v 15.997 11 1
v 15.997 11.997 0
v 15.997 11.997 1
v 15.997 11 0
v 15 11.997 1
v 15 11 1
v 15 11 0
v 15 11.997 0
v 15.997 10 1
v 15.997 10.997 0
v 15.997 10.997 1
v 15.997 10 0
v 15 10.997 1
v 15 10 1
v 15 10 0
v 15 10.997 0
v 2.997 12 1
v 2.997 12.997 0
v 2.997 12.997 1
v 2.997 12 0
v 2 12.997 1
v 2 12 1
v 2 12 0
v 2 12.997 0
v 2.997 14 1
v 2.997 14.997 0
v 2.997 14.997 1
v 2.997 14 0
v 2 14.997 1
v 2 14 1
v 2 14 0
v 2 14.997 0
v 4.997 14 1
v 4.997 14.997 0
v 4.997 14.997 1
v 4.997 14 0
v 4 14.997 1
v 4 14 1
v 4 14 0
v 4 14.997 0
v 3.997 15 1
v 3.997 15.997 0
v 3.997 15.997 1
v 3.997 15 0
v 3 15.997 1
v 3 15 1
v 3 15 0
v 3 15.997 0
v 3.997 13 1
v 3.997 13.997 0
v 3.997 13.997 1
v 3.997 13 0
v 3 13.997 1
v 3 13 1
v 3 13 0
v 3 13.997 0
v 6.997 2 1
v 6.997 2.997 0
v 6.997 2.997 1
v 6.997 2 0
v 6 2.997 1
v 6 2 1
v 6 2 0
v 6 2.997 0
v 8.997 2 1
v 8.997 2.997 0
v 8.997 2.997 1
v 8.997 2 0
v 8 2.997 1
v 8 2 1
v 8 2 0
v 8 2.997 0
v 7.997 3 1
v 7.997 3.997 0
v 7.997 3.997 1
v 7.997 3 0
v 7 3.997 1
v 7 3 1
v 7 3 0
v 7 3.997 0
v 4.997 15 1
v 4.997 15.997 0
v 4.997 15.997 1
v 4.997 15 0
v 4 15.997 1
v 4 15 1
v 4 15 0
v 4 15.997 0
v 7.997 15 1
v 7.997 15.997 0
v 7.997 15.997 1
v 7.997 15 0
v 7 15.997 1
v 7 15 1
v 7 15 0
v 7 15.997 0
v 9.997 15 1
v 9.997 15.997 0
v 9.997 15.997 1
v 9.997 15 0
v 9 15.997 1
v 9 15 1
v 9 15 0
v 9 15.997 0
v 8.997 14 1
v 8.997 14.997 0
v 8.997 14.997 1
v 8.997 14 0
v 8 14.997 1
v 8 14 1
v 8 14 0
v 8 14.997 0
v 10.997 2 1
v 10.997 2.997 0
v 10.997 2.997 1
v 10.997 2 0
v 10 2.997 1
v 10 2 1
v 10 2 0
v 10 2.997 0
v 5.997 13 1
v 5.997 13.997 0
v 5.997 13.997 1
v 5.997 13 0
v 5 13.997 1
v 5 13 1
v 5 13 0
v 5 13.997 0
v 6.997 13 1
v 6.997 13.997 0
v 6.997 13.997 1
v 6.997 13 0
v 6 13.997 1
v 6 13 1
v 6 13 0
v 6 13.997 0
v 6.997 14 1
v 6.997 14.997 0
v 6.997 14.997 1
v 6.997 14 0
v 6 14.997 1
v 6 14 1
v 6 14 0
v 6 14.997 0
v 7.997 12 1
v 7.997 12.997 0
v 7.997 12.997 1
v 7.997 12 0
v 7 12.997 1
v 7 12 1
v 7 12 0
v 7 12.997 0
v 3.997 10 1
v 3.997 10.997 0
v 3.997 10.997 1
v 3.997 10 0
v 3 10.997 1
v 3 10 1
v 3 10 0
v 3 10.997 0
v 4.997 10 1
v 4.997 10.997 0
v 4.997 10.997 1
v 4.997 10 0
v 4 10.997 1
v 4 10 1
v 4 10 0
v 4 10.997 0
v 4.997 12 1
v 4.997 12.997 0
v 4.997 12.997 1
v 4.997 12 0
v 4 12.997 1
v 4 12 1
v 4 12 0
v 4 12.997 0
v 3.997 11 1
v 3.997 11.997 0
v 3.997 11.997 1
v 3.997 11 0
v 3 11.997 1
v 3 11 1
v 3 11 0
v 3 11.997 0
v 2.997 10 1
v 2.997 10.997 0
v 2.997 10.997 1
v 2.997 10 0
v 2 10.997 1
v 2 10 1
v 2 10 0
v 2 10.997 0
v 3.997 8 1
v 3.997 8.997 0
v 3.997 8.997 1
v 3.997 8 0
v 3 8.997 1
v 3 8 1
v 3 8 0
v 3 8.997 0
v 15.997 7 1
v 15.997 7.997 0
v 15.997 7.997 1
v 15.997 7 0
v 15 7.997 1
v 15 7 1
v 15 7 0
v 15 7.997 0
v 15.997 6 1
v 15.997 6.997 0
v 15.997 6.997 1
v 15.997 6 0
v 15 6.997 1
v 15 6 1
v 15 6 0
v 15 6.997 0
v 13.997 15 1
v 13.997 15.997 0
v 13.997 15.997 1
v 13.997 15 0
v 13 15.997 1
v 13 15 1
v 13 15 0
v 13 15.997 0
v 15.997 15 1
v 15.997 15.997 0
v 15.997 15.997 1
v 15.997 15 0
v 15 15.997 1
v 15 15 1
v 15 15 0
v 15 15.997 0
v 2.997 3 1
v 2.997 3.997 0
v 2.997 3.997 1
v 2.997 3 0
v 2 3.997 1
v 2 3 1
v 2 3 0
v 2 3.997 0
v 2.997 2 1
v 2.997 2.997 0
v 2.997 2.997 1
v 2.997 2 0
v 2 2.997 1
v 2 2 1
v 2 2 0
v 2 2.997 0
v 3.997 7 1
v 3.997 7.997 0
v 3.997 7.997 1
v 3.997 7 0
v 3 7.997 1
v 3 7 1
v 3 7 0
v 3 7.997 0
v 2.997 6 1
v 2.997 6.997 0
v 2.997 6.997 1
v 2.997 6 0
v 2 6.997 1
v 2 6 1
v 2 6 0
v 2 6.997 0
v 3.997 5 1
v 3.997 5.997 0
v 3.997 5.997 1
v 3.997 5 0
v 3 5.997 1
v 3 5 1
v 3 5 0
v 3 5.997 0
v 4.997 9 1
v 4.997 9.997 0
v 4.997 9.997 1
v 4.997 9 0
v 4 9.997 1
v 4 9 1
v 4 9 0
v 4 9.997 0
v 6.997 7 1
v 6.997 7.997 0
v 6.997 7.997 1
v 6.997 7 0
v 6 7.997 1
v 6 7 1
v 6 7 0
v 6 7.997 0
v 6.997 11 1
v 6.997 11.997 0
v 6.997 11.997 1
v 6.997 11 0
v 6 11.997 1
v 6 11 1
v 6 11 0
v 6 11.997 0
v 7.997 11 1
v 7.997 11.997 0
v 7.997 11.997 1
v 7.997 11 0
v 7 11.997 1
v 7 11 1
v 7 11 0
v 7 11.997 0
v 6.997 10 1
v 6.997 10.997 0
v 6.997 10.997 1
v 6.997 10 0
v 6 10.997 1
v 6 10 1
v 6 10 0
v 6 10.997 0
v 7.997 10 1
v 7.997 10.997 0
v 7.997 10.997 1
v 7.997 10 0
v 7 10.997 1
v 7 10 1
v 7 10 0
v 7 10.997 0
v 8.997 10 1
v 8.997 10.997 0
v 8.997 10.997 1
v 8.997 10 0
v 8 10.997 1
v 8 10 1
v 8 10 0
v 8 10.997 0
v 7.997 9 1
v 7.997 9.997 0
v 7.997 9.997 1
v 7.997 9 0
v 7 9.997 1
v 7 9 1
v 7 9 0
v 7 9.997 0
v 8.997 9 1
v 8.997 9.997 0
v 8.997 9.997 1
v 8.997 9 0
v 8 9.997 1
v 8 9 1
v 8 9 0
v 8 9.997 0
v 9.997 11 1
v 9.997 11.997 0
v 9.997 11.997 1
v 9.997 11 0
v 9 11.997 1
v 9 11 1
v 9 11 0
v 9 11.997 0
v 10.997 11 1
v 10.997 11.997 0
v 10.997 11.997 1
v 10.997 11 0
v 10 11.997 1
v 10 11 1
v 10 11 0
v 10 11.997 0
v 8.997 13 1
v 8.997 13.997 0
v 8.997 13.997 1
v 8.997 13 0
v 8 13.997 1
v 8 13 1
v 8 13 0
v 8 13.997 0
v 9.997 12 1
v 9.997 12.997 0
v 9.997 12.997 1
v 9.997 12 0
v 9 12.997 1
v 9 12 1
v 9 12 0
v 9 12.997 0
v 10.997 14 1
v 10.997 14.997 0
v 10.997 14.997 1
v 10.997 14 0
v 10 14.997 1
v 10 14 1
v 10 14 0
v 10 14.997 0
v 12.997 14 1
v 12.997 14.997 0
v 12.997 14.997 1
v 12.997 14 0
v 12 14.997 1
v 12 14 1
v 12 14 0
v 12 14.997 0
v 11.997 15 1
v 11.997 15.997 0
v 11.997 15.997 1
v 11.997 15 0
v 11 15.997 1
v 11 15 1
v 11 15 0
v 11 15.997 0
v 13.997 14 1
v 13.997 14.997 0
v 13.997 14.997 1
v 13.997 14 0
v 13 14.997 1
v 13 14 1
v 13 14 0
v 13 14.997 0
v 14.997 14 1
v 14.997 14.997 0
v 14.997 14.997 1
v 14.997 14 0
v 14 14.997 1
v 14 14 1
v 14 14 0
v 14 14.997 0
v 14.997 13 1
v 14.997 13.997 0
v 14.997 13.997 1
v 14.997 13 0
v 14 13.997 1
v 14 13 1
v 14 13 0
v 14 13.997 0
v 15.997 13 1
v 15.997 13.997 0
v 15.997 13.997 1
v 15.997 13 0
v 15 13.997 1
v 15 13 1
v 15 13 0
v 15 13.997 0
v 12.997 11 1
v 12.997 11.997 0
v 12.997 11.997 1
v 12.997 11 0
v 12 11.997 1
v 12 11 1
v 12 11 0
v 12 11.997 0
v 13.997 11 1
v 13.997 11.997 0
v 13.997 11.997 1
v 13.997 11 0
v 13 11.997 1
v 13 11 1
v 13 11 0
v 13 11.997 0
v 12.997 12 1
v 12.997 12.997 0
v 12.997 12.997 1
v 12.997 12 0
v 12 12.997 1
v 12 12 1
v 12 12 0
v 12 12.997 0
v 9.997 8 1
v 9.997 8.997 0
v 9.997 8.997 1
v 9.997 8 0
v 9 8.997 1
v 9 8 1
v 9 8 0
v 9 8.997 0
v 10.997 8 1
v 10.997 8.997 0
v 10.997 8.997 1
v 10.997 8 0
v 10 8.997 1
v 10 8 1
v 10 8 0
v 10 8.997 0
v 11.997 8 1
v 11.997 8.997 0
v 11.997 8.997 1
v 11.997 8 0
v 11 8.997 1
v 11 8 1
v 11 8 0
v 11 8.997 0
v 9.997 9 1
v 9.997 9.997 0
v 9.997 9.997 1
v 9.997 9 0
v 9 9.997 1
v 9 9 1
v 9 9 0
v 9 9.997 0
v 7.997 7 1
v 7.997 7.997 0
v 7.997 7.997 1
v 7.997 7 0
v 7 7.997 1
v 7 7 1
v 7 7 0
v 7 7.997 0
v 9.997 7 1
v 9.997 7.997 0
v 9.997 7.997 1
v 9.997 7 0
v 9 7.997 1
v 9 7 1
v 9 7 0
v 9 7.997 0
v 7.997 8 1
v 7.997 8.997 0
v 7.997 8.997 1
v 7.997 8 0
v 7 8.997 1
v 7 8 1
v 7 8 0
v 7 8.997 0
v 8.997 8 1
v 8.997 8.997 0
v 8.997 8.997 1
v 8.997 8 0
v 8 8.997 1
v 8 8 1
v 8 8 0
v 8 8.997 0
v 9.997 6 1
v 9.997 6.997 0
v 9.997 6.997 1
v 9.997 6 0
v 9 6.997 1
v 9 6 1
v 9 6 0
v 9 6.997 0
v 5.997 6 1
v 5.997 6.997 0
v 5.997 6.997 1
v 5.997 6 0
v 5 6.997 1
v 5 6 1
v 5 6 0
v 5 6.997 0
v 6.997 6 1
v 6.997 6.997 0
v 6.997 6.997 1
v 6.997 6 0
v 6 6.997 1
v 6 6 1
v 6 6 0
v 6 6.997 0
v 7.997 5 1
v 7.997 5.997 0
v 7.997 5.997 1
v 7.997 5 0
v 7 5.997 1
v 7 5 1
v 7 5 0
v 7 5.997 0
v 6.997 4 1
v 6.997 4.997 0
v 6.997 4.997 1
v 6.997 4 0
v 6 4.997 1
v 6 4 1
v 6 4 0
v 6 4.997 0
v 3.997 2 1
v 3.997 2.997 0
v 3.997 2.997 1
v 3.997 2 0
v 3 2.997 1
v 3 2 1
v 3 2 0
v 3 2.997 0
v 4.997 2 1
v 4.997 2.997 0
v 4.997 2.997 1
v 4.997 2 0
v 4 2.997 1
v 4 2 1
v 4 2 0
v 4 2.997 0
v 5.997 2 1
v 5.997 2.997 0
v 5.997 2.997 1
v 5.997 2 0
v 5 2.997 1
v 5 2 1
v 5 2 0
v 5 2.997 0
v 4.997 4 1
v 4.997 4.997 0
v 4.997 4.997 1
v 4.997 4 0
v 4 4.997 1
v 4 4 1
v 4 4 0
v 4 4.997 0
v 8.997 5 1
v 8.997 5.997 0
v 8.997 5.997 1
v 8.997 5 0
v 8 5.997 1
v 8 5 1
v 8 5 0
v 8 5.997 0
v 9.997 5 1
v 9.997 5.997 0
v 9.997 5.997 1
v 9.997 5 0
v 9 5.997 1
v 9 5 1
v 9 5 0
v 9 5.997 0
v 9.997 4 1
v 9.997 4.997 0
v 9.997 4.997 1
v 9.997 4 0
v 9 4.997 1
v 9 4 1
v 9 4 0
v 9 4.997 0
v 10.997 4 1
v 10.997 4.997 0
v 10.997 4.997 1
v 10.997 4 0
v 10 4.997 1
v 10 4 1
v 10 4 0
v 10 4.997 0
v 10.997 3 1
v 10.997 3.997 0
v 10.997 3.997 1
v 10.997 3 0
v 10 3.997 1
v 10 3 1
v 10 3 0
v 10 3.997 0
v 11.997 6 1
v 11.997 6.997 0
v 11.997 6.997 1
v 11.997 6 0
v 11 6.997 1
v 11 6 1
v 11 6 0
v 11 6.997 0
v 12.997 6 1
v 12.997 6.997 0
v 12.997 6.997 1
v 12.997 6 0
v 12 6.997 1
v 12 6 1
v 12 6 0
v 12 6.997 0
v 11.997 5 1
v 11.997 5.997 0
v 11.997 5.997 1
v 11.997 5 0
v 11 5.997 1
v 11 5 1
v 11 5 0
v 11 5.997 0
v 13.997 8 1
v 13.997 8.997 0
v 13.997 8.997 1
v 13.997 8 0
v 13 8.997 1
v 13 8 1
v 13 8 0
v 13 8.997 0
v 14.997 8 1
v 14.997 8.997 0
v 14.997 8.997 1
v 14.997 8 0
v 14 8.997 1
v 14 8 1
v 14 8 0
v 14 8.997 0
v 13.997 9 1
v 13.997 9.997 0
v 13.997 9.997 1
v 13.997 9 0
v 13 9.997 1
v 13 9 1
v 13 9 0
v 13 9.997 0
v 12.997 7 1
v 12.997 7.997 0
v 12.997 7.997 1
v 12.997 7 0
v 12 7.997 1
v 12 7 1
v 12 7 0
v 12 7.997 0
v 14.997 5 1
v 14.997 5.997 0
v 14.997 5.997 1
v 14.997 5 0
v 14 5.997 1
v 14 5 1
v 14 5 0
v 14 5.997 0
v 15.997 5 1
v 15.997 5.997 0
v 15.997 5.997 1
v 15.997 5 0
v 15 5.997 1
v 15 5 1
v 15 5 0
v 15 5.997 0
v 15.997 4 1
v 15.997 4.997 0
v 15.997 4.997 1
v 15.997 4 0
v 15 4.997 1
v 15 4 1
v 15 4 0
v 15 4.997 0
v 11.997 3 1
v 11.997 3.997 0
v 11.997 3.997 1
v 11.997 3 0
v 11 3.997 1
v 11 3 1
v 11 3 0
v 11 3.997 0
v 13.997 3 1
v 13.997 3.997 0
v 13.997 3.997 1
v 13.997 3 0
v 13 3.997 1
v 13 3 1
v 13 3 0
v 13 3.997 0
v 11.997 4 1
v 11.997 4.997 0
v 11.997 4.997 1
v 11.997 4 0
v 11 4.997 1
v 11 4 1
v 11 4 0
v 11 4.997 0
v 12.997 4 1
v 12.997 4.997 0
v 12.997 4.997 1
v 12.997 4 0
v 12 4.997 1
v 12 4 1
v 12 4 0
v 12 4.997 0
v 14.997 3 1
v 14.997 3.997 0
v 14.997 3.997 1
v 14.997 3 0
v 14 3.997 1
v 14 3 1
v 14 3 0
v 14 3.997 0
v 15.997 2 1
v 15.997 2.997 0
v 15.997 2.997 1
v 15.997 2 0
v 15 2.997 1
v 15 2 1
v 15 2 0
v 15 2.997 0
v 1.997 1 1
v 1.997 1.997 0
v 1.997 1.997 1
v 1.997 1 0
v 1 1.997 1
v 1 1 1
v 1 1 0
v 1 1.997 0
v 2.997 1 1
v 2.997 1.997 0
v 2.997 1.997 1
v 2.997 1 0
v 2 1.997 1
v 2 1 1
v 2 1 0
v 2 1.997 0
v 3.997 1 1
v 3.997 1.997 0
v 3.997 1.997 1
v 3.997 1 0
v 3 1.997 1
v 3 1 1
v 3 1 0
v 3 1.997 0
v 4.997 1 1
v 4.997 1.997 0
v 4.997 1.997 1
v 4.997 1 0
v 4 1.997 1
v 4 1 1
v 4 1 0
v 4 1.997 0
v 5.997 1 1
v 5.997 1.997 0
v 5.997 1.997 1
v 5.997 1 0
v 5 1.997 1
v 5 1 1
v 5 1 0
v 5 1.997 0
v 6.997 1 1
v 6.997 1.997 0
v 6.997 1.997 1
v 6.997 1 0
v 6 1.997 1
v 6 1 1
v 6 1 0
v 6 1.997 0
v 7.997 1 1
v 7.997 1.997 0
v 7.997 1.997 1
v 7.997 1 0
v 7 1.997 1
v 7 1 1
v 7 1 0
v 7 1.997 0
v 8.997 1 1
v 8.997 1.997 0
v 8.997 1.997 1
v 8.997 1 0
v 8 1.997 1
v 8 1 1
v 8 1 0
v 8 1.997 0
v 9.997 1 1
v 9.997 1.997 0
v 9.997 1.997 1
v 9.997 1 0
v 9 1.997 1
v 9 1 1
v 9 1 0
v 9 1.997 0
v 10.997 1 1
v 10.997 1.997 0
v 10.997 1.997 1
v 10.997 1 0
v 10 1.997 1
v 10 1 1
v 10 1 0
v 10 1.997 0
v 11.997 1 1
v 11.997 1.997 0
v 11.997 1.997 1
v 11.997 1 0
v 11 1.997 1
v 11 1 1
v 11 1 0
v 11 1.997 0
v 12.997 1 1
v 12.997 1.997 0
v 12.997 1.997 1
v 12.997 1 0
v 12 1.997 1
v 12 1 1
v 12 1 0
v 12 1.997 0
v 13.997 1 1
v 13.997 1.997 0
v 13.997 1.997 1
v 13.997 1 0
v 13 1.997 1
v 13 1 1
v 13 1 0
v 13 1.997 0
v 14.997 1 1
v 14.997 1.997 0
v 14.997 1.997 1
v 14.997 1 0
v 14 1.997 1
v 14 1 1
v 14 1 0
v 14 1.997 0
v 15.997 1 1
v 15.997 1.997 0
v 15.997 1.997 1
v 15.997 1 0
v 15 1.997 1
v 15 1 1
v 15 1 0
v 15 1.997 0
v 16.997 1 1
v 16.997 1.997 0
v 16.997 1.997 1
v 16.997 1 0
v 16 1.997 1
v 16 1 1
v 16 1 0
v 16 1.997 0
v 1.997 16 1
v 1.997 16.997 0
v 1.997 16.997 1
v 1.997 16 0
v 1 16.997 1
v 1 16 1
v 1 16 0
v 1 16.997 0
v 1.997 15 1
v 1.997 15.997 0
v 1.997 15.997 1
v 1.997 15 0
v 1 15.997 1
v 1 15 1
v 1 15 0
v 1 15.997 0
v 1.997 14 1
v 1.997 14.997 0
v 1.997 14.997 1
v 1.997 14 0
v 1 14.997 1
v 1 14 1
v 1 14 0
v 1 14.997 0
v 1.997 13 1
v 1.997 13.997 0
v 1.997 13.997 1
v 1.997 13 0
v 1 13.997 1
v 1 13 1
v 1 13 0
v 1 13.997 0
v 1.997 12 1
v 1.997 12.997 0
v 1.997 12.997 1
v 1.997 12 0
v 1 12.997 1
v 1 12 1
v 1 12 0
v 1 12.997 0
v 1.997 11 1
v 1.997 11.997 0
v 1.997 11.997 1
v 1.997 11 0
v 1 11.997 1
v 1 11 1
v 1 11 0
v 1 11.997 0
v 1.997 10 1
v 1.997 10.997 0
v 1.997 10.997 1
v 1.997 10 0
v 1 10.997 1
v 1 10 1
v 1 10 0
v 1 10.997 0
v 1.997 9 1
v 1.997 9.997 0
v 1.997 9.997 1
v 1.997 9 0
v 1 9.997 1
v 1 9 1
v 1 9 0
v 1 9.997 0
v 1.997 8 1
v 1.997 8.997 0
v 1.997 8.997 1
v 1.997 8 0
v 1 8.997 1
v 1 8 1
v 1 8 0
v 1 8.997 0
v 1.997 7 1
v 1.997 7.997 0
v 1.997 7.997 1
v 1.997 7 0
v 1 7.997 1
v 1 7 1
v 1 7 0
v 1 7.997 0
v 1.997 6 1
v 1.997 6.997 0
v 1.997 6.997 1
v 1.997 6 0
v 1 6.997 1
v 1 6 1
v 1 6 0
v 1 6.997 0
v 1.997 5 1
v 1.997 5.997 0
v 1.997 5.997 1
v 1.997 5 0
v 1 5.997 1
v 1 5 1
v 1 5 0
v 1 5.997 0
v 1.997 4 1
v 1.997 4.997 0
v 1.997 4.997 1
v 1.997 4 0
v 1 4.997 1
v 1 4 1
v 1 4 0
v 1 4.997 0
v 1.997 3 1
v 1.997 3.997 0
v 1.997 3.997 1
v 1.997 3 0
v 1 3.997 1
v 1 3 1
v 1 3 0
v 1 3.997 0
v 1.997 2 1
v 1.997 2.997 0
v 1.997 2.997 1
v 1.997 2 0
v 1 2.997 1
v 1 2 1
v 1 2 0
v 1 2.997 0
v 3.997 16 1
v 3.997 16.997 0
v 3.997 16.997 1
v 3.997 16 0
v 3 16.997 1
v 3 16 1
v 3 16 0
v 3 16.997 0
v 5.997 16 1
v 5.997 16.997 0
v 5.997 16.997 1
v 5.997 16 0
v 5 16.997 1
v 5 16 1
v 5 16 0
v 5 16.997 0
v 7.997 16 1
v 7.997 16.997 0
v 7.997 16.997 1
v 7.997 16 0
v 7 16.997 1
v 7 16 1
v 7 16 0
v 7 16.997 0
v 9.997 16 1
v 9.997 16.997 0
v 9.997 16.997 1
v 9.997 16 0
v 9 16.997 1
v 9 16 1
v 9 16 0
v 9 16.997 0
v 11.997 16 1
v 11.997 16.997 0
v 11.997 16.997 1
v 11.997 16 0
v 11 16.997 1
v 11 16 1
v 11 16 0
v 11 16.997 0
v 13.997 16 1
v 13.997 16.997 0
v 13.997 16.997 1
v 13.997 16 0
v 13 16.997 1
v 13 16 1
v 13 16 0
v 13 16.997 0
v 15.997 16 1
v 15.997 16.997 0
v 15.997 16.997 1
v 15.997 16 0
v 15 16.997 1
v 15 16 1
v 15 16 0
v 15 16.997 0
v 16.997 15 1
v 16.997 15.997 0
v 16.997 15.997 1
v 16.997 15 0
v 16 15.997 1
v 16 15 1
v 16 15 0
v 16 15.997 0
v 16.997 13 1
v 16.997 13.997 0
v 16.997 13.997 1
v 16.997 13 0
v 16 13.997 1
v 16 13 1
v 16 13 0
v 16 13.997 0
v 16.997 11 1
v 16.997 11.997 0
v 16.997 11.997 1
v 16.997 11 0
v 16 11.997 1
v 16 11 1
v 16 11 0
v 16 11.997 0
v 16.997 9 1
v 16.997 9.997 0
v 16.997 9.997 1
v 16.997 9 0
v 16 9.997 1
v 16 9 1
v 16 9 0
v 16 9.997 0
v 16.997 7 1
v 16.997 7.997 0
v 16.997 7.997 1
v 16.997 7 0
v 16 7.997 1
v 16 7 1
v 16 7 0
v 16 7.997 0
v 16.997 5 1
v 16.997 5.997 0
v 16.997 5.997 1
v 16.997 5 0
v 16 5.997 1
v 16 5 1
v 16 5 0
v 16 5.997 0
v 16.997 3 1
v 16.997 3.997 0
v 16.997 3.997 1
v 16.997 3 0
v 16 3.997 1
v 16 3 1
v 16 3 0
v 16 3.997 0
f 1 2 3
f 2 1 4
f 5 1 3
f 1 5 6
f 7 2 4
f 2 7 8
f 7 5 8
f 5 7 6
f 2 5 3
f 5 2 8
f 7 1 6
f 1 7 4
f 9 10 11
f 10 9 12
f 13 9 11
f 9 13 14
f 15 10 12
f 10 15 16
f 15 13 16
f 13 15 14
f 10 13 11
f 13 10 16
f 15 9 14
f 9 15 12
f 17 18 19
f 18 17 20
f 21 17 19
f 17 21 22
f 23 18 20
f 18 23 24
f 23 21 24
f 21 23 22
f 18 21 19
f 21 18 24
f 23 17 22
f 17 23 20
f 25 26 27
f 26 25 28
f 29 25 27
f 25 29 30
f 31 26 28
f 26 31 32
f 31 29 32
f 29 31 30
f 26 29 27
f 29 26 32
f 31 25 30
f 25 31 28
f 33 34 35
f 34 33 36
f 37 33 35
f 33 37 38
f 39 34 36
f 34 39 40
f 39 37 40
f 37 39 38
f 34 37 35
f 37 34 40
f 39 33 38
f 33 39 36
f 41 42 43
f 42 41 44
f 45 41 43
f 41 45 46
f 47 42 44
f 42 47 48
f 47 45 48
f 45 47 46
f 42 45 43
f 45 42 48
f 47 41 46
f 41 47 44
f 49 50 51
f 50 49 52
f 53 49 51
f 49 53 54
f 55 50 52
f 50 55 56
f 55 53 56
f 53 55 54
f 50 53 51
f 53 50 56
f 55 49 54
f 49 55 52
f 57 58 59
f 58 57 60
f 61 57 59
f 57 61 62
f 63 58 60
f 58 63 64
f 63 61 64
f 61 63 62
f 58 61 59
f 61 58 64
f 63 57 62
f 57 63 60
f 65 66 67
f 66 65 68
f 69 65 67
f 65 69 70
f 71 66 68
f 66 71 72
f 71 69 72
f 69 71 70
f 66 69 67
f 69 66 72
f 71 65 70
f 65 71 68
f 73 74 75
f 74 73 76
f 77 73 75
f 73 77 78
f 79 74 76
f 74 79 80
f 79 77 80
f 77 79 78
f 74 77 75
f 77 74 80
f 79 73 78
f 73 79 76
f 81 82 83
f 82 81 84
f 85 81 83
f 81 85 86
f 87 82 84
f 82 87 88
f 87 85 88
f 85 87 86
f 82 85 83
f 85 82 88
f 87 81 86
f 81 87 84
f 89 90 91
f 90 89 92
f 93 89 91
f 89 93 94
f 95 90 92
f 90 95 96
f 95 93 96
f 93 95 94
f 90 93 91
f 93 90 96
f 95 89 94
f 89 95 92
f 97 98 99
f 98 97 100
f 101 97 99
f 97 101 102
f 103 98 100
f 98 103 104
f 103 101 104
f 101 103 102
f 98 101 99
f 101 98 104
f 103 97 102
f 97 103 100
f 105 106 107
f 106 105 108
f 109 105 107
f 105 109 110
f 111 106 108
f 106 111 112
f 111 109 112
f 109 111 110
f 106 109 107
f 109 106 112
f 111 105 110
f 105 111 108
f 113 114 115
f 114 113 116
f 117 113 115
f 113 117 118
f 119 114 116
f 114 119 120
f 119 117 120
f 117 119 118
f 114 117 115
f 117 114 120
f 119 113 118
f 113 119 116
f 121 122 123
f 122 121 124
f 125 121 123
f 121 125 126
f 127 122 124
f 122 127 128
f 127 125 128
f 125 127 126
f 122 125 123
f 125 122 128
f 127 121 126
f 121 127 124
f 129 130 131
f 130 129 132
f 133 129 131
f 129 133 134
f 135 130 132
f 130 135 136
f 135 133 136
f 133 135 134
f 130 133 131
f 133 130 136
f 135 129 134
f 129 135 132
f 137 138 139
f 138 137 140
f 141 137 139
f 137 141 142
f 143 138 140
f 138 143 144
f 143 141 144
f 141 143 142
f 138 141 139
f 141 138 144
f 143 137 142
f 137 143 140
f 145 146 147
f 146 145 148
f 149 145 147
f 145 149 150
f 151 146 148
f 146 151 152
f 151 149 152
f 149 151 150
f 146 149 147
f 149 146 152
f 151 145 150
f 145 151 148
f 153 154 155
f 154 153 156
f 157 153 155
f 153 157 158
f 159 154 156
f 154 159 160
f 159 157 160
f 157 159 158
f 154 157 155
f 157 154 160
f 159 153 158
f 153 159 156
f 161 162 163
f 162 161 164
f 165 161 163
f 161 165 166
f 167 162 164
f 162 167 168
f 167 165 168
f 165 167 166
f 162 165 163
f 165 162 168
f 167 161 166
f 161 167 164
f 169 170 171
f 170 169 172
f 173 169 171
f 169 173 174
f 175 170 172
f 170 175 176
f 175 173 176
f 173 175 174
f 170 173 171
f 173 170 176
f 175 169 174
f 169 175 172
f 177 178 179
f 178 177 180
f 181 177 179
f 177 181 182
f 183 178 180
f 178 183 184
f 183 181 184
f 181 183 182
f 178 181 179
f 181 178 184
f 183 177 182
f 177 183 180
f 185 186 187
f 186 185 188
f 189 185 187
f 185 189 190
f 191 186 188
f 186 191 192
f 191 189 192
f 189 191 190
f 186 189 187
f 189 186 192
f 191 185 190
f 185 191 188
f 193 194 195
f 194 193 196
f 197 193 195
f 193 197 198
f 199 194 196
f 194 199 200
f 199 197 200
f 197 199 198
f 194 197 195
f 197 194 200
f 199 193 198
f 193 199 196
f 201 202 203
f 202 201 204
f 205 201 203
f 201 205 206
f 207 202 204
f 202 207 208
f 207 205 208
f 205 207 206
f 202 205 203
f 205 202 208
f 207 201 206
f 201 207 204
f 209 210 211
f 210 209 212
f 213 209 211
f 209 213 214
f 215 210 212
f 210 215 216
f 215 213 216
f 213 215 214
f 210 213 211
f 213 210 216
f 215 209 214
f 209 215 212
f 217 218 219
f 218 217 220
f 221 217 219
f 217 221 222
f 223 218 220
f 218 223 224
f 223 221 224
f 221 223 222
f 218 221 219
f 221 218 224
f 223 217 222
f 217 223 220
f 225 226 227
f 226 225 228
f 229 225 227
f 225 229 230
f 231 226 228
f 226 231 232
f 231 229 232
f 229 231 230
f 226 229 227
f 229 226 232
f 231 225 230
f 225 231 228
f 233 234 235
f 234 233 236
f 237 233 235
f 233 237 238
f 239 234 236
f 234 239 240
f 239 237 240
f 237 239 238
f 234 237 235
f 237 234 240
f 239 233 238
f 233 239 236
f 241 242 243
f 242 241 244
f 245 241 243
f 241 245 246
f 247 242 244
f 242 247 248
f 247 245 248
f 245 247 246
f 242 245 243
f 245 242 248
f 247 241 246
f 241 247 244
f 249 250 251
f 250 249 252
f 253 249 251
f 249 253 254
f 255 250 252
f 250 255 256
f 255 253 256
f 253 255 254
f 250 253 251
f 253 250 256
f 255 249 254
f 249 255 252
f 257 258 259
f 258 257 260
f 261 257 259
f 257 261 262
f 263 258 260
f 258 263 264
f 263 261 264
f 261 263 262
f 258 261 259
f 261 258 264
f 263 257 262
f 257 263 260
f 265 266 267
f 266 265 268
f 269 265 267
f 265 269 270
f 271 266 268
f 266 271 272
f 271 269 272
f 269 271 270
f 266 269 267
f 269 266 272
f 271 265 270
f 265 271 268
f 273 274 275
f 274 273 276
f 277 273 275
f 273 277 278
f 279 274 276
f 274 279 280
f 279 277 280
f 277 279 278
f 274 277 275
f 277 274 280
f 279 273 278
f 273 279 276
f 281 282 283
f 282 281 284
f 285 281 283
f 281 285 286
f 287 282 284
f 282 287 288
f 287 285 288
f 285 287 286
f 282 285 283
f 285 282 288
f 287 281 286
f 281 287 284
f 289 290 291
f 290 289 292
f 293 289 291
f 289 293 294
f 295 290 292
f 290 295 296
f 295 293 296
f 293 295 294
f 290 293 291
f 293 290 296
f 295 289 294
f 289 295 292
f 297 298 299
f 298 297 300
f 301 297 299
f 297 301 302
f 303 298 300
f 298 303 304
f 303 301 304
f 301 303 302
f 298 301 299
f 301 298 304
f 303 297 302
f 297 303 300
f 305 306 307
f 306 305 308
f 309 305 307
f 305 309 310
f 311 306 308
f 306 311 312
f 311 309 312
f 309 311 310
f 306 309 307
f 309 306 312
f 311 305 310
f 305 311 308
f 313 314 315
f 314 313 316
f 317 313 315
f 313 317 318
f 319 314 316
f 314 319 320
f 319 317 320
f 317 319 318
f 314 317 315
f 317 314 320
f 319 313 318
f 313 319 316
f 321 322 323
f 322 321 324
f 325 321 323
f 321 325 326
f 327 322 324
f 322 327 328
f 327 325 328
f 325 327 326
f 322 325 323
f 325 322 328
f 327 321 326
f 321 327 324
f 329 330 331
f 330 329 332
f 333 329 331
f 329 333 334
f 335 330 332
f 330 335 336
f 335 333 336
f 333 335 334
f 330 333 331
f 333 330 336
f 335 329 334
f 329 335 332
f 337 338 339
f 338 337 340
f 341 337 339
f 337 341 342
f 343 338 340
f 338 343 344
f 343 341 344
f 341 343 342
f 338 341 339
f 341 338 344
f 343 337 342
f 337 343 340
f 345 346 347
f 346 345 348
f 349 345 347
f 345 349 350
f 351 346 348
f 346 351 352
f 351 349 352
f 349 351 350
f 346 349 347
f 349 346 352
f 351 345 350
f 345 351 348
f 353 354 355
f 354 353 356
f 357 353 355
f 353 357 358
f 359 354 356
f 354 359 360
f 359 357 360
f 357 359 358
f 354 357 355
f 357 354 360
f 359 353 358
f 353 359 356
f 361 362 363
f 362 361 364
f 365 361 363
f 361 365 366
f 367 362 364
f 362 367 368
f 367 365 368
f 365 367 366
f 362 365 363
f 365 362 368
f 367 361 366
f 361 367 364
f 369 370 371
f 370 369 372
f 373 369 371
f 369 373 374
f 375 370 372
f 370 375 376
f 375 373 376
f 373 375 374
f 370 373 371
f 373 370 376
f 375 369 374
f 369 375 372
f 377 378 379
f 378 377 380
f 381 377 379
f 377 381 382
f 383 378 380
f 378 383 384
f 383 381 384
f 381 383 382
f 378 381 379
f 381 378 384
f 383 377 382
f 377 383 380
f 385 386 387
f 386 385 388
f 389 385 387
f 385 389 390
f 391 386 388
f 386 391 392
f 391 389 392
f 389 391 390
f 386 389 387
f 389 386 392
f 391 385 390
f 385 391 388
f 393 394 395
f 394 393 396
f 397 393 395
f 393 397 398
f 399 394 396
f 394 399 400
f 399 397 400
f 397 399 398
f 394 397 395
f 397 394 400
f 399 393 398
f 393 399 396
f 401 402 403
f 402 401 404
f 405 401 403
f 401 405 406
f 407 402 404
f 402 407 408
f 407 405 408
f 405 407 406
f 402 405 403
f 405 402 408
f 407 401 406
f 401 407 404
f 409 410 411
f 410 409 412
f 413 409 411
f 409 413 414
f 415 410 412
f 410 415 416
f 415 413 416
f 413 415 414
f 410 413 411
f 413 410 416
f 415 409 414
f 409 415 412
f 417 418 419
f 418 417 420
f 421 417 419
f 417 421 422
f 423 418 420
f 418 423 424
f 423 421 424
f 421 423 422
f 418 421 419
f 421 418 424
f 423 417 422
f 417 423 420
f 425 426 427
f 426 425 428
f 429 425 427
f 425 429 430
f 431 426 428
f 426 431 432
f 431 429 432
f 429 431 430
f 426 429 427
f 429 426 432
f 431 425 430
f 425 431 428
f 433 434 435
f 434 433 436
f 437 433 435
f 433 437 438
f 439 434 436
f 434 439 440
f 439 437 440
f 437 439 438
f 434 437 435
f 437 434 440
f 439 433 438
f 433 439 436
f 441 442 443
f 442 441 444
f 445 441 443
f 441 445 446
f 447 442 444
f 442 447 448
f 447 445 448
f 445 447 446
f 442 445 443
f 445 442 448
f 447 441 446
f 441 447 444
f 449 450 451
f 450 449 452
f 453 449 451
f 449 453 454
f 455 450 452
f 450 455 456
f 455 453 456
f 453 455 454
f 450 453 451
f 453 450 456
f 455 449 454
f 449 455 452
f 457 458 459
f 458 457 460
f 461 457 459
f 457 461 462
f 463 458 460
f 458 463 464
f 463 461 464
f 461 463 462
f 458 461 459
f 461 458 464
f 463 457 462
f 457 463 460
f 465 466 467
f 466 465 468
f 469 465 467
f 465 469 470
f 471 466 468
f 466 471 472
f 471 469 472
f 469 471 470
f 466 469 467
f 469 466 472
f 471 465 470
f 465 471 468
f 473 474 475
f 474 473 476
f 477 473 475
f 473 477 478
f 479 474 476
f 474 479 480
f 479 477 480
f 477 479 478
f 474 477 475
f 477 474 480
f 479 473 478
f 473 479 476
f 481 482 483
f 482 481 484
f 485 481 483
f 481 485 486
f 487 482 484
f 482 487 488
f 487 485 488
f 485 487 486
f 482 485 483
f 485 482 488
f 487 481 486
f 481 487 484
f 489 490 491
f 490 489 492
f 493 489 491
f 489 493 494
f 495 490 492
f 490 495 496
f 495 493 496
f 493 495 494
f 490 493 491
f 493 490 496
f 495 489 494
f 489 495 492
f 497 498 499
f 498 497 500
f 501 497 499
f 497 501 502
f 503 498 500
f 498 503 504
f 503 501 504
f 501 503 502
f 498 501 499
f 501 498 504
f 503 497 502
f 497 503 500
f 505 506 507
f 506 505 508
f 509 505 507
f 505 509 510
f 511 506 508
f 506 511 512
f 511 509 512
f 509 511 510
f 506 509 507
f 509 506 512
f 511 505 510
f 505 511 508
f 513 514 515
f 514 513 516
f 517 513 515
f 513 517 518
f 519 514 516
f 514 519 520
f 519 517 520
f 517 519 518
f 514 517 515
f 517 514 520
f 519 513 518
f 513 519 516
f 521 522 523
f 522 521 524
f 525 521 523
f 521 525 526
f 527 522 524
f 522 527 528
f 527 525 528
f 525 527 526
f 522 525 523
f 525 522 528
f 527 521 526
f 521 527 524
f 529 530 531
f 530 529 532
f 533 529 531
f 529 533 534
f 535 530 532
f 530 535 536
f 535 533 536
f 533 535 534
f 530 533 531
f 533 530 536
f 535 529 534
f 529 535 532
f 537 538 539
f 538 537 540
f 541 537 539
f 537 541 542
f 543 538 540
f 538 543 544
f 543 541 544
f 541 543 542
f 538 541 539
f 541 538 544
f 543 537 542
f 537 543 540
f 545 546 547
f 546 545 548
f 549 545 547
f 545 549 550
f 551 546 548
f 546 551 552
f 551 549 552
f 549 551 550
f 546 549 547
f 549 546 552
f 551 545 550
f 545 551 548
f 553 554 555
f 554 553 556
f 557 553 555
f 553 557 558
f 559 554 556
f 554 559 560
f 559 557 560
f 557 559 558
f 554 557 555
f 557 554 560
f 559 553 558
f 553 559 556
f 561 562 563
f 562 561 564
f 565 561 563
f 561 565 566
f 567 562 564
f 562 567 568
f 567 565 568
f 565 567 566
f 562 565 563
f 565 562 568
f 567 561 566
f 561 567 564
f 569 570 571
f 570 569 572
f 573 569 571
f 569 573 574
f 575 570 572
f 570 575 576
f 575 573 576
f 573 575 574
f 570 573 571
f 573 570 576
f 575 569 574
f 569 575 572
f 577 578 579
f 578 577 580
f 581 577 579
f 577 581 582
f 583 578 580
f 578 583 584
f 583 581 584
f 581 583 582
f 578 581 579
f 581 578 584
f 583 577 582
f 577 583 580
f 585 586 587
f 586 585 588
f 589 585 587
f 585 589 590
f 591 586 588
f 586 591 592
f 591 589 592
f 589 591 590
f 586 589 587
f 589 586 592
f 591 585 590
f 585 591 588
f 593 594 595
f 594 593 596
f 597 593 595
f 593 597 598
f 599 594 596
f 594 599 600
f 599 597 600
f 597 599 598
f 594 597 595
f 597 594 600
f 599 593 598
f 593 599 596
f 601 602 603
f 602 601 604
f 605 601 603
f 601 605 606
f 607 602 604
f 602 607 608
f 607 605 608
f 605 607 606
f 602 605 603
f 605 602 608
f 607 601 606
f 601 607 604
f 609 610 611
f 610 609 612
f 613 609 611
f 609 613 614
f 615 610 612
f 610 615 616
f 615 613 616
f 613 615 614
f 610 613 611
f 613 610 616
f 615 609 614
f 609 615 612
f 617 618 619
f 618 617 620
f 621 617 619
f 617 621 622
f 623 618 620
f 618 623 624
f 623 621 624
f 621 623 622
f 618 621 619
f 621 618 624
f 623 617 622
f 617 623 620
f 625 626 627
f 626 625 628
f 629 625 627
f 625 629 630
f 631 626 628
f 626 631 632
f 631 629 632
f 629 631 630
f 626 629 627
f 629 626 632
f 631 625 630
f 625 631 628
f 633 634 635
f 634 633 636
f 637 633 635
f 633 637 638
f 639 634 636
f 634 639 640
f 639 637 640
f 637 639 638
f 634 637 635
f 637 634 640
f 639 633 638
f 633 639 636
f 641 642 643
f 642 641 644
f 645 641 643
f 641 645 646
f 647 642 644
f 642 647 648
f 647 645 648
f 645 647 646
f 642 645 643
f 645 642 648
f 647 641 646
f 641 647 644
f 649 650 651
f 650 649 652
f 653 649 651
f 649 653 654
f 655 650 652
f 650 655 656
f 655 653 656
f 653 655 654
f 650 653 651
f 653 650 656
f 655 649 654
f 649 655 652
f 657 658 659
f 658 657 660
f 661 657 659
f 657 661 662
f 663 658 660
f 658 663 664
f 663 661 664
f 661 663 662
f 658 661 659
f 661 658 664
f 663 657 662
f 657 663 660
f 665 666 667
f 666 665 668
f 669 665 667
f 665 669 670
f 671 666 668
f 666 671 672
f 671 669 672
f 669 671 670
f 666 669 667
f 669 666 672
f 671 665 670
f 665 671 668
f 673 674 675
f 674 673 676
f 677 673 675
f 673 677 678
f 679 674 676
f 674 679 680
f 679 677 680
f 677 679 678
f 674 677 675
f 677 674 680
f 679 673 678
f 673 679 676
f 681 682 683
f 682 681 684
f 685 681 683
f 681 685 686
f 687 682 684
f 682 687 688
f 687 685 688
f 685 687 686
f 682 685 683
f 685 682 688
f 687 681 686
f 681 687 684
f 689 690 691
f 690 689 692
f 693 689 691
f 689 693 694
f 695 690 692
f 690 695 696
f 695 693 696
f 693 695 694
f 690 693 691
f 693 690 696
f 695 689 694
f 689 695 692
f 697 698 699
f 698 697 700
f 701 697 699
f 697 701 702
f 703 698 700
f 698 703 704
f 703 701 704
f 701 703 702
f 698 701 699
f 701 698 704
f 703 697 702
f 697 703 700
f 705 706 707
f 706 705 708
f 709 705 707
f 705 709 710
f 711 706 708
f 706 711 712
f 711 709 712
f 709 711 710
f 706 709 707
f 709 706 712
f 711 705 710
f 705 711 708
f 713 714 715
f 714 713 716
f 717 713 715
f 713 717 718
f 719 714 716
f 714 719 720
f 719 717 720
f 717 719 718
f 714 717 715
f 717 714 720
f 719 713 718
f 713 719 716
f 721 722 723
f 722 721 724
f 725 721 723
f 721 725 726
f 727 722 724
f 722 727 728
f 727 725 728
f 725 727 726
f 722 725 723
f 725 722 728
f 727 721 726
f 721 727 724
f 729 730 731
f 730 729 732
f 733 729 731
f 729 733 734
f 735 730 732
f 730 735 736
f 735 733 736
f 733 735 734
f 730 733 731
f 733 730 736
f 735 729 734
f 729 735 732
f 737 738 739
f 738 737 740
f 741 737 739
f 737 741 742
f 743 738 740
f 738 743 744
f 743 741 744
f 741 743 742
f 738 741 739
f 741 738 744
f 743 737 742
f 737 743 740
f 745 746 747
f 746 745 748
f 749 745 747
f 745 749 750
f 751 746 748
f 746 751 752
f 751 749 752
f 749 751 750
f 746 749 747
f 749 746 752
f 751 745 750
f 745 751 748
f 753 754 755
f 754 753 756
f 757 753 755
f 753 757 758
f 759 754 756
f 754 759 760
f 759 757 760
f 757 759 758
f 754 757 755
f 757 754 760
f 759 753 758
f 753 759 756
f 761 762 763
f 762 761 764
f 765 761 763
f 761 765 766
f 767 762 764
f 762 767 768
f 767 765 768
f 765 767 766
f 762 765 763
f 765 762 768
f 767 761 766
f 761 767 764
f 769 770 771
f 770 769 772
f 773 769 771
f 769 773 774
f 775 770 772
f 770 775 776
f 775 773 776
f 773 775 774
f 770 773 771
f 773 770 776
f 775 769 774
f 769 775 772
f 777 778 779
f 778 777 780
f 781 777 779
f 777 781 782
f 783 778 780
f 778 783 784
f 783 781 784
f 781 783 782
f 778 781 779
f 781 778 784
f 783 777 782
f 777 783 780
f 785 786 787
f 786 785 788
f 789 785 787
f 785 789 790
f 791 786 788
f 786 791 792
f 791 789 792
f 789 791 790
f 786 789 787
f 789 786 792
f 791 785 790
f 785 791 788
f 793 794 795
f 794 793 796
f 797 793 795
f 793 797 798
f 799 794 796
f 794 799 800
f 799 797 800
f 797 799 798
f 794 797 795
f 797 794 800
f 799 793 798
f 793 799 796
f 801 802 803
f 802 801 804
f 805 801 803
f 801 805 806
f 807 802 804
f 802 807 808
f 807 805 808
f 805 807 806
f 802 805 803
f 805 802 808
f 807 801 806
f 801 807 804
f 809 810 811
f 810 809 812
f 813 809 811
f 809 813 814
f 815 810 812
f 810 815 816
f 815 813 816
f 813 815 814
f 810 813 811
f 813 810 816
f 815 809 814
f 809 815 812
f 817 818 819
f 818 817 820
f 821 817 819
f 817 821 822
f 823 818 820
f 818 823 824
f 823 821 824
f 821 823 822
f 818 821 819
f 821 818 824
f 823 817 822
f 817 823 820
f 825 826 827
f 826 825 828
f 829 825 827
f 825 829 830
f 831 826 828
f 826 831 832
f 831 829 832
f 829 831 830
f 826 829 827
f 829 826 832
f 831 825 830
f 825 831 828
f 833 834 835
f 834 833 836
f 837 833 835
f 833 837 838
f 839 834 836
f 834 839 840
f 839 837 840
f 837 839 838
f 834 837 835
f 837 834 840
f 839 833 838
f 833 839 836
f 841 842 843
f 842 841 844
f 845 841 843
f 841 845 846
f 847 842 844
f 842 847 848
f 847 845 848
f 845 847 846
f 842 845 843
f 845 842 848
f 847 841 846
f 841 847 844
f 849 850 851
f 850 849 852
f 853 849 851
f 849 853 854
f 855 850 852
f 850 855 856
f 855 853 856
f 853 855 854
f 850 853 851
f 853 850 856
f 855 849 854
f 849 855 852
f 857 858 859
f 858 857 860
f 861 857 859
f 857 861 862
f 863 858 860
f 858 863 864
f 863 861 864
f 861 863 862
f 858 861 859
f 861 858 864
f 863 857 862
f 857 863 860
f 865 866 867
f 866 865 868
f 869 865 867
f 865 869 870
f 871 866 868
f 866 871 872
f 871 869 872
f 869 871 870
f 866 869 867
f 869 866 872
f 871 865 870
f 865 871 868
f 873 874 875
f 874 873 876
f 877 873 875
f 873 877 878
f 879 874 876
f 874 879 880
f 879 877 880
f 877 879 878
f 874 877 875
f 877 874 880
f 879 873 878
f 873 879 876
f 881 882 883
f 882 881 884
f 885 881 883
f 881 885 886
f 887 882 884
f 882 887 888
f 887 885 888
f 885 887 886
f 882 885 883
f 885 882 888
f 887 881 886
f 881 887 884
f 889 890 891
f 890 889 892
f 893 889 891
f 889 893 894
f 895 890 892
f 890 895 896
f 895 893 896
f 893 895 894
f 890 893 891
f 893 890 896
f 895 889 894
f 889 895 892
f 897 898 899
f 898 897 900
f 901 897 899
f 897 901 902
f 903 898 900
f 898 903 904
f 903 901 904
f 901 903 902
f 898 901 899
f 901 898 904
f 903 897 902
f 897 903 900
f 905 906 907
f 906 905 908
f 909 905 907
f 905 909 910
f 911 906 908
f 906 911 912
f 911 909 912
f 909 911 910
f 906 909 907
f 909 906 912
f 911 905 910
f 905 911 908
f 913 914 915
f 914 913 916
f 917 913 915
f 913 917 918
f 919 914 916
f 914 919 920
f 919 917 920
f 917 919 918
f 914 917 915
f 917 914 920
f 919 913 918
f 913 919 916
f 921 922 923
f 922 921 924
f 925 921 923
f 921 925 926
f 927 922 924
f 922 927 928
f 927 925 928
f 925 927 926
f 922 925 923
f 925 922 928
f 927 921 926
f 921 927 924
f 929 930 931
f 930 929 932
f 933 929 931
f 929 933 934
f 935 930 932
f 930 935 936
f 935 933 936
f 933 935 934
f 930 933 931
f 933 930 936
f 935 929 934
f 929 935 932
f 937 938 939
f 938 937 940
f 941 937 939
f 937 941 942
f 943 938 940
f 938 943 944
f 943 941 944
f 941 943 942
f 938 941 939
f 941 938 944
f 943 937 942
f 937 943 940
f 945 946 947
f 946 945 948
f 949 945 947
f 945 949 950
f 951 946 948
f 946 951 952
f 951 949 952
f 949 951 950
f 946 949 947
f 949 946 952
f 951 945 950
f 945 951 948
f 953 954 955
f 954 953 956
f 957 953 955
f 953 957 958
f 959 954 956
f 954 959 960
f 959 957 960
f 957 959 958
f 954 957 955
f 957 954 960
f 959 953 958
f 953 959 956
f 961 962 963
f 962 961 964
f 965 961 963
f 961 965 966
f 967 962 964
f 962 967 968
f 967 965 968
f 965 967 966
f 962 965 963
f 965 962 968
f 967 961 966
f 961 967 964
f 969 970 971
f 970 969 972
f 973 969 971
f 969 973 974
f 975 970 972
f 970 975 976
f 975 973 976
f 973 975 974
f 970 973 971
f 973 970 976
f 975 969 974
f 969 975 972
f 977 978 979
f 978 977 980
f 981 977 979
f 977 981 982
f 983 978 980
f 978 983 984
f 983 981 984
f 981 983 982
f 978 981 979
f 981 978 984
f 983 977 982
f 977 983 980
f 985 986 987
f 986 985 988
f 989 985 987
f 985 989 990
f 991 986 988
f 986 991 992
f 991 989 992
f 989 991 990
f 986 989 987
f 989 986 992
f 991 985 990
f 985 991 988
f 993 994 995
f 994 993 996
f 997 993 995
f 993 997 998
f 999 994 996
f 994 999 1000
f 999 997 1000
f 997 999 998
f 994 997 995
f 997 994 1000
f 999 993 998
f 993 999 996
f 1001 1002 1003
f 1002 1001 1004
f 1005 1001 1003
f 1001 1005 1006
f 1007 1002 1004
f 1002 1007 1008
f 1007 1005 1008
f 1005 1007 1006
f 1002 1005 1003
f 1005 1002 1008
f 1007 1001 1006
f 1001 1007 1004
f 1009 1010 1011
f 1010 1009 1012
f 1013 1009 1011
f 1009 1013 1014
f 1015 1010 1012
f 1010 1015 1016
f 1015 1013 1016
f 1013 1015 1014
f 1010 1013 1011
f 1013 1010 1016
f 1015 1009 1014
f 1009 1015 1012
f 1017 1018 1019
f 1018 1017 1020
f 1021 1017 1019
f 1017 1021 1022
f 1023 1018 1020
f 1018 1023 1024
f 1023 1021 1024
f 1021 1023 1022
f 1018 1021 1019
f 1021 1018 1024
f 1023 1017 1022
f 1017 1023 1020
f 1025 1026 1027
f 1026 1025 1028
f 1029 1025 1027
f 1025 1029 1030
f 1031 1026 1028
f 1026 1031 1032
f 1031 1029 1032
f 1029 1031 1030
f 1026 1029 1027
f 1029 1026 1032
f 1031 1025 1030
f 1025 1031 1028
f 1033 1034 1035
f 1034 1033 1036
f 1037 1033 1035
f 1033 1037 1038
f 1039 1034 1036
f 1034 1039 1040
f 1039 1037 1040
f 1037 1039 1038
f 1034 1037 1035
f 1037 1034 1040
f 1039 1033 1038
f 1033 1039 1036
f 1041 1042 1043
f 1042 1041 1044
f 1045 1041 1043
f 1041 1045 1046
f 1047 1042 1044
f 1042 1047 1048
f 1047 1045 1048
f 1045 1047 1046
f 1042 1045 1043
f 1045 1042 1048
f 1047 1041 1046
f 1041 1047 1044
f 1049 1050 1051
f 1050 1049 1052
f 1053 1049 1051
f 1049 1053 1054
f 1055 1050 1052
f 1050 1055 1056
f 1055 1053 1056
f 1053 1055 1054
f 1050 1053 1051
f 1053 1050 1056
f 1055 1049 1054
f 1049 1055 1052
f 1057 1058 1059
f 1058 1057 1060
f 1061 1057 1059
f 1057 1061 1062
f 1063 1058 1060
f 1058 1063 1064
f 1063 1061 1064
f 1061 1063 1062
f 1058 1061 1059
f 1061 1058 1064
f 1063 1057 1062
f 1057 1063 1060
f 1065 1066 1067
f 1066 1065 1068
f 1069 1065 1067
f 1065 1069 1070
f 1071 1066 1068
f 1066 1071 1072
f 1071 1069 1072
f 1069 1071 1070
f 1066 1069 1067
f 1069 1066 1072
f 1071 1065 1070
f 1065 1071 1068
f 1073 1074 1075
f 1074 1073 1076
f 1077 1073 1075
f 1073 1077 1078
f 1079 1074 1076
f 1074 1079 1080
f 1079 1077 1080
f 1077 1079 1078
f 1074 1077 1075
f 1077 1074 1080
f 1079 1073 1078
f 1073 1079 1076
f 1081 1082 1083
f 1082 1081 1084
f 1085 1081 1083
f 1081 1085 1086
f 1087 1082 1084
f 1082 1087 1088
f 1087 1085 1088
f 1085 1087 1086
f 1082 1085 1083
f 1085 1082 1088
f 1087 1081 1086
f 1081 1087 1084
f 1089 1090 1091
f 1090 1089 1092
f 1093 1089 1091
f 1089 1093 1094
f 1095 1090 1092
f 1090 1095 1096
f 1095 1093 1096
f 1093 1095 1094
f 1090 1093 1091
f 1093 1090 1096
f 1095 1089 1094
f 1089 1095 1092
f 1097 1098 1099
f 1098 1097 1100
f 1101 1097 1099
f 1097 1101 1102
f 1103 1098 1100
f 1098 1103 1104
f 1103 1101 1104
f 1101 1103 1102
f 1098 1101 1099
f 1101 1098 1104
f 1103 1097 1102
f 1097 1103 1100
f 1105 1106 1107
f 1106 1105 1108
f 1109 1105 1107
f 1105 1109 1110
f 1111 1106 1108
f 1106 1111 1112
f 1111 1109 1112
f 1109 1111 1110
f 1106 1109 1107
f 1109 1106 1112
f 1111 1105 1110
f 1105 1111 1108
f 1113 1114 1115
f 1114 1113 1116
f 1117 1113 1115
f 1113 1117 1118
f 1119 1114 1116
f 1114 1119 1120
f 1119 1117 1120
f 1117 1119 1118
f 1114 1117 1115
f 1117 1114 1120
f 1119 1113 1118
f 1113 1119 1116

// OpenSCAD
// file: ../../util/bitmap.scad
/*****************************************************************************
 * Module Bitmap Library
 * Modules to create bitmaps of unit squares from 1 or 2 dimensional vectors.
 *****************************************************************************
 * Copyright 2017 Chris Baker
 *
 * This program is free software: you can redistribute it and/or modify
 * it under the terms of the GNU Lesser General Public License as published by
 * the Free Software Foundation, either version 3 of the License, or
 * (at your option) any later version.
 *
 * This program is distributed in the hope that it will be useful,
 * but WITHOUT ANY WARRANTY; without even the implied warranty of
 * MERCHANTABILITY or FITNESS FOR A PARTICULAR PURPOSE.  See the
 * GNU Lesser General Public License for more details.
 *
 * You should have received a copy of the GNU Lesser General Public License
 * along with this program.  If not, see <http://www.gnu.org/licenses/>.
 *****************************************************************************
 * Usage:
 * Include this file with the "use" tag.
 * Depends on compat.scad library.
 *
 * API:
 *   1dbitmap(bitmap, center, pullback, vector_mode)
 *   2dbitmap(bitmap, center, pullback, vector_mode)
 *     Generate a 1 or 2-Dimensional field of modules based on the provided
 *     bitmap vector. See Bitmap Vectors below.
 *     The center flag determines whether to center the bitmap on the origin.
 *     The pullback value shrinks each module in the x and y dimension by the
 *     specified amount. A negative value will expand the modules so they
 *     blend into each other.
 *     The vector_mode flag determines whether to create 3D solid geometry
 *     (unit cubes) or 2D vector geometry (squares).
 *
 * Bitmap Vectors:
 *   The bitmap vectors primarily provide boolean information.
 *   A module will be placed where these vectors have a postive value and
 *   skipped where they have a negative value. I.E. 0, -1, false, and undef
 *   are all equivalent and result in a skip. 1 and true are equivalent and
 *   result in a placed 1-unit module.
 *   Further, if the value is an integer it will be treated as a height for
 *   the module, allowing z-maps to be created.
 *   If the value is not an integer or boolean, it will be treated as a color
 *   reference. This can be a string or RGBA vector that will be used to
 *   color the module in the OpenSCAD preview window.
 *   In current versions of OpenSCAD, the color has no effect in the rendered
 *   view or STL output.
 *
 * Vector Mode:
 *   Although OpenSCAD supports generating 2D geometry, there are several
 *   caveats:
 *   - 2D and 3D geometry cannot be mixed
 *   - Extruding 2D geometry causes color information to be lost
 *   - All 2D geometry is projected onto the XY plane when rendering
 *   - Rendering also results in loss of color (same as 3D)
 *   - The SVG exporter is somewhat limited:
 *     - The pixel size of the image is hard-coded in the file
 *     - The title of the image is a generic string
 *     - The color selection for stroke and fill is fixed
 *     - The stroke-width is set to a large value that will cause overlap
 *     - The background is transparent
 *     - Only one path element is created with all of the geometry; there is
 *       no easy way to split up the geometry into multiple logical units.
 *     - These issues can mostly be resolved by hand-editing the file:
 *       - Remove or modify the width and height parameters from the svg
 *         element at the top of the file to provide better scaling.
 *       - Edit the title element at the top of the file to change the title.
 *       - Edit the stroke and fill parameters of the path element (these will
 *         probably be at the end of the file).
 *       - Set the stroke-width parameter for the path element to 0.
 *****************************************************************************/
use <compat.scad>

/*
 * 2dbitmap - Turn a 2D vector into a bitmap of cubes
 *
 * bitmap - 2D vector representing where to place each cube
 *          Value can either be boolean, z-height, or color
 * center - center cubes around the origin
 * pullback - size of gap around each pixel (screendoor)
 * vector_mode - create a 2D vector drawing instead of 3D extrusion
 */
module 2dbitmap(bitmap=[[1,0],[0,1]], center=false, pullback=0.003, vector_mode=false)
{
  if (bitmap!=undef) {
	ylen=len(bitmap)-1;

	for (y=[0:ylen]) {
		xlen=len(bitmap[y])-1;
		for (x=[0:xlen])
			translate([x-(center?xlen/2:0),ylen-y-(center?ylen/2:0),0])
				if (is_indexable(bitmap[y][x]))
					color(bitmap[y][x])
						if (vector_mode)
							square([1-pullback,1-pullback], center=center);
						else
							cube([1-pullback,1-pullback,1], center=center);
				else
					if (bitmap[y][x])
						if (vector_mode)
							square([1-pullback,1-pullback], center=center);
						else
							cube([1-pullback,1-pullback,clamp_nonnum(bitmap[y][x])], center=center);
	}
  }
}

module 1dbitmap(bitmap=[1,0,1,0,1], center=false, pullback=-0.003, vector_mode=false)
	if (bitmap!=undef)
		2dbitmap([bitmap], center, pullback, vector_mode);

/*
 * Examples
 */

// 1D with z-height
translate([10,0,0]) scale([1,10,1])
	1dbitmap(bitmap=[1,1,0,2,0,0,3], pullback=.1);

// 1D with boolean
translate([-20,0,0]) scale([1,10,1])
	1dbitmap(bitmap=[true,false,true,false,true,true]);

// 2D with z-height
scale([2,2,1])
	2dbitmap(bitmap=[[1,0,2,1],[0,3,3,0],[1,1,0,1]],
		center=true);

// 1D with color
translate([0,-10,0]) scale([1,3,1])
	1dbitmap(bitmap=["red","white","blue",[0,0.3,0,0.5]]);

// 1D with color using 2D-vector-mode
translate([-7,-8,0]) scale([1,2])
	1dbitmap(bitmap=["red",0,"blue",0,"green"], vector_mode=true);
translate([-4.5,-10,0]) scale([1,2])
	1dbitmap(bitmap=["red",0,"blue",0,"green"], vector_mode=true, center=true);

// Check behavior with undef
1dbitmap(undef);
2dbitmap(undef);
// file: ../../util/bitlib.scad
/*****************************************************************************
 * Bit Manipulation Library
 * Provides some useful bit manipulation functions.
 *****************************************************************************
 * Copyright 2017 Chris Baker
 *
 * This program is free software: you can redistribute it and/or modify
 * it under the terms of the GNU Lesser General Public License as published by
 * the Free Software Foundation, either version 3 of the License, or
 * (at your option) any later version.
 *
 * This program is distributed in the hope that it will be useful,
 * but WITHOUT ANY WARRANTY; without even the implied warranty of
 * MERCHANTABILITY or FITNESS FOR A PARTICULAR PURPOSE.  See the
 * GNU Lesser General Public License for more details.
 *
 * You should have received a copy of the GNU Lesser General Public License
 * along with this program.  If not, see <http://www.gnu.org/licenses/>.
 *****************************************************************************
 * Usage:
 * Include this file with the "use" tag.
 * When run on its own, all echo statements in this library should print
 * "true".
 *
 * API:
 *   bit(v,b)
 *     Return the truth value of the b'th bit of v.
 *
 *   check_bit_size(v,b,signed=false)
 *     Determine whether the value v can be represented with b bits (b must
 *     be positive).
 *     The signed flag indicates whether to include the sign bit in the
 *     determination; otherwise negative values will result in undef being
 *     returned.
 *
 *   xor(a,b)
 *     Return the value of a xor b.
 *     Handles arbitrary size values for a and b.
 *     Handles negative values as expected (a positive result will be returned
 *     unless a and b have differing signs).
 *
 * TODO:
 *  - Change echos to asserts (future OpenSCAD version)
 *  - Add more functions
 *
 *****************************************************************************/

//Return the truth value of the b'th bit of v
function bit(v,b) =
	((v==undef)||(b==undef)||(b<0))?undef:
	(floor(v / pow(2, b)) % 2)?true:false;

echo("*** bit() testcases ***");
echo(0,bit(0,0)==false);
echo(1,bit(-1,0)==true);
echo(2,bit(1,0)==true);
echo(3,[for (i=[0:63]) bit(0,i)]==[for (i=[0:63]) false]); //0=0...0
echo(4,[for (i=[0:63]) bit(-1,i)]==[for (i=[0:63]) true]); //-1=1...1
echo(5,[for (i=[1:63]) bit(1,i)]==[for (i=[1:63]) false]); //1=0...01
echo(6,[for (i=[0:7]) bit(85,i)?1:0]==[1,0,1,0,1,0,1,0]); //85=01010101
echo(7,[for (i=[0:7]) bit(170,i)?1:0]==[0,1,0,1,0,1,0,1]); //170=10101010
echo(8,[for (i=[0:7]) bit(165,i)?1:0]==[1,0,1,0,0,1,0,1]); //165=10100101
echo(9,[for (i=[0:7]) bit(56,i)?1:0]==[0,0,0,1,1,1,0,0]); //56=00111000
echo(10,[for (i=[0:7]) bit(-3,i)?1:0]==[1,0,1,1,1,1,1,1]); //-3=1...101
//(2^64)=0...01 0...0
echo(11,bit(pow(2,64),64)==true);
echo(12,[for (i=[0:63]) bit(pow(2,64),i)]==[for (i=[0:63]) false]);
echo(13,[for (i=[65:127]) bit(pow(2,64),i)]==[for (i=[1:63]) false]);
//-(2^64)=1...1 0...0
echo(14,[for (i=[0:63]) bit(-pow(2,64),i)]==[for (i=[0:63]) false]);
echo(15,[for (i=[64:127]) bit(-pow(2,64),i)]==[for (i=[0:63]) true]);
echo(16,bit(10,-1)==undef);
echo(17,bit(10,undef)==undef);
echo(18,bit(undef,3)==undef);

//return true if v can be represented in b bits
//if signed flag is set. the result will be adjusted
//to account for the needed sign bit
function check_bit_size(v,b,signed=false) =
	(b<0)?undef:
	(v==undef)?undef:
	(b==0)?false:
	(v==0)?true: //(b>0)
	(signed)?
		(v<0)?(-pow(2,b-1)<(v+1)):
			(pow(2,b-1)>(v+1)):
		(v<0)?undef:
			(pow(2,b)>v);

echo("*** check_bit_size() testcases ***");
echo(0,check_bit_size(-1,2)==undef);
echo(1,check_bit_size(2,-4)==undef);
echo(2,check_bit_size(2,-4,signed=true)==undef);
echo(3,check_bit_size(0,0)==false);
echo(4,check_bit_size(0,1)==true);
echo(5,check_bit_size(1,0)==false);
echo(6,check_bit_size(1,1)==true);
echo(7,check_bit_size(7,3)==true);
echo(8,check_bit_size(8,3)==false);
echo(9,check_bit_size(1,3)==true);
echo(10,check_bit_size(256,8)==false);
echo(11,check_bit_size(255,8)==true);
echo(12,check_bit_size(10,2)==false);
echo(13,check_bit_size(10,4)==true);
echo(14,check_bit_size(-10,2,signed=true)==false);
echo(15,check_bit_size(-10,4,signed=true)==false);
echo(16,check_bit_size(-10,5,signed=true)==true);
echo(17,check_bit_size(-1,0,signed=true)==false);
echo(18,check_bit_size(-1,1,signed=true)==true);
echo(19,check_bit_size(0,0,signed=true)==false);
echo(20,check_bit_size(0,1,signed=true)==true);
echo(21,check_bit_size(-2,2,signed=true)==true);
echo(22,check_bit_size(-3,2,signed=true)==false);
echo(23,check_bit_size(-3,3,signed=true)==true);
echo(24,check_bit_size(-8,3,signed=true)==false);
echo(25,check_bit_size(-8,4,signed=true)==true);
echo(26,check_bit_size(undef,4)==undef);
echo(27,check_bit_size(undef,4,signed=true)==undef);

//return the value of a xor b
//runs recursively until all bits of a and b are exhausted
function xor(a,b,i=0) =
	((a==undef)||(b==undef))?undef:
	let (c=bit(a,i), d=bit(b,i),
		 v=((c||d) && !(c&&d))?pow(2,i):0)
		(check_bit_size(a,i,signed=true) &&
		 check_bit_size(b,i,signed=true))?
			-v: //special case for sign bit
			v+xor(a,b,i+1); //recursively add powers of 2

echo("*** xor() testcases ***");
echo(0,xor(42,0)==42);
echo(1,xor(42,42)==0);
echo(2,xor(169,238)==71); //10101001^11101110=01000111=71
echo(3,xor(238,169)==71);
echo(4,xor(42,238)==196); //00101010^11101110=11000100=196
echo(5,xor(169,42)==131); //10101001^00101010=10000011=131
echo(6,xor(-8,-10)==14); //11000^10110=01110=14
echo(7,xor(-7,-10)==15); //11001^10110=01111=15
echo(8,xor(9,-10)==-1); //01001^10110=11111=-1
echo(9,xor(9,-12)==-3); //01001^10100=11101=-3
echo(10,xor(undef,0)==undef);
// file: ../../util/stringlib.scad
/*****************************************************************************
 * String Manipulation Library
 * Provides some useful string manipulation functions.
 *****************************************************************************
 * Copyright 2017 Chris Baker
 *
 * This program is free software: you can redistribute it and/or modify
 * it under the terms of the GNU Lesser General Public License as published by
 * the Free Software Foundation, either version 3 of the License, or
 * (at your option) any later version.
 *
 * This program is distributed in the hope that it will be useful,
 * but WITHOUT ANY WARRANTY; without even the implied warranty of
 * MERCHANTABILITY or FITNESS FOR A PARTICULAR PURPOSE.  See the
 * GNU Lesser General Public License for more details.
 *
 * You should have received a copy of the GNU Lesser General Public License
 * along with this program.  If not, see <http://www.gnu.org/licenses/>.
 *****************************************************************************
 * Usage:
 * Include this file with the "use" tag.
 * Depends on compat.scad library.
 *
 * API:
 *   atoi(a)
 *     Convert the string of numerals, a, to a vector of individual decimal
 *     numbers.
 *
 *   ascii_to_vec(a)
 *     Convert the ASCII string, a, into a vector of decimal numbers.
 *
 *****************************************************************************/
use <compat.scad>

/*
 * atoi - convert ASCII numerals to a vector of individual decimal numbers
 *
 * a - the ASCII string of numerals
 */
function atoi(a) = (isa_string(a))?
	[
		let (val = search(a, "0123456789"))
			for (i = val) i
	]
	:
	undef;

/* *** atoi() testcases *** */
do_assert(atoi(undef)==undef,     "atoi test 00");
do_assert(atoi(true)==undef,      "atoi test 01");
do_assert(atoi(false)==undef,     "atoi test 02");
do_assert(atoi([])==undef,        "atoi test 03");
do_assert(atoi([1,2,3])==undef,   "atoi test 04");
do_assert(atoi("")==[],           "atoi test 05");
do_assert(atoi("0")==[0],         "atoi test 06");
do_assert(atoi("1")==[1],         "atoi test 07");
do_assert(atoi("2")==[2],         "atoi test 08");
do_assert(atoi("3")==[3],         "atoi test 09");
do_assert(atoi("4")==[4],         "atoi test 10");
do_assert(atoi("5")==[5],         "atoi test 11");
do_assert(atoi("6")==[6],         "atoi test 12");
do_assert(atoi("7")==[7],         "atoi test 13");
do_assert(atoi("8")==[8],         "atoi test 14");
do_assert(atoi("9")==[9],         "atoi test 15");
do_assert(atoi("123")==[1,2,3],   "atoi test 16");
do_assert(atoi("1a23b")==[1,2,3], "atoi test 17"); //degenerate case, don't really care too much about the result

/*
 * ascii_to_vec - convert ASCII string to decimal vector
 *
 * a - the ASCII string to vectorize
 */
function ascii_to_vec(a) = (isa_string(a))?
	[
		let (val = search(a, "\x01\x02\x03\x04\x05\x06\x07\x08\x09\x0a\x0b\x0c\x0d\x0e\x0f\x10\x11\x12\x13\x14\x15\x16\x17\x18\x19\x1a\x1b\x1c\x1d\x1e\x1f !\"#$%&'()*+,-./0123456789:;<=>?@ABCDEFGHIJKLMNOPQRSTUVWXYZ[\\]^_`abcdefghijklmnopqrstuvwxyz{|}~\x7f"))
			for (i = val) i+1
	]:
	undef;

/* *** ascii_to_vec() testcases *** */
do_assert(ascii_to_vec(undef)==undef,   "ascii_to_vec test 01");
do_assert(ascii_to_vec(true)==undef,    "ascii_to_vec test 02");
do_assert(ascii_to_vec(false)==undef,   "ascii_to_vec test 03");
do_assert(ascii_to_vec([])==undef,      "ascii_to_vec test 04");
do_assert(ascii_to_vec([1,2,3])==undef, "ascii_to_vec test 05");
do_assert(ascii_to_vec("")==[],         "ascii_to_vec test 06");
do_assert(ascii_to_vec("0")==[48],      "ascii_to_vec test 07");
do_assert(ascii_to_vec("a")==[97],      "ascii_to_vec test 08");
do_assert(ascii_to_vec("0123456789")==[48,49,50,51,52,53,54,55,56,57],
	"ascii_to_vec test 09");
do_assert(ascii_to_vec("The quick brown fox jumped over the lazy dog.")
	==[84,104,101,32,113,117,105,99,107,32,98,114,111,119,110,32,102,111,120,32,106,117,109,112,101,100,32,111,118,101,114,32,116,104,101,32,108,97,122,121,32,100,111,103,46],
	"ascii_to_vec test 10");
// main file
/* Unit Test 05: 16x16 - 12 data bytes, 12 ecc bytes - From Wikipedia */
use <../datamatrix.scad>
data_matrix(dm_ascii("Wikipedia"), mark="black");
